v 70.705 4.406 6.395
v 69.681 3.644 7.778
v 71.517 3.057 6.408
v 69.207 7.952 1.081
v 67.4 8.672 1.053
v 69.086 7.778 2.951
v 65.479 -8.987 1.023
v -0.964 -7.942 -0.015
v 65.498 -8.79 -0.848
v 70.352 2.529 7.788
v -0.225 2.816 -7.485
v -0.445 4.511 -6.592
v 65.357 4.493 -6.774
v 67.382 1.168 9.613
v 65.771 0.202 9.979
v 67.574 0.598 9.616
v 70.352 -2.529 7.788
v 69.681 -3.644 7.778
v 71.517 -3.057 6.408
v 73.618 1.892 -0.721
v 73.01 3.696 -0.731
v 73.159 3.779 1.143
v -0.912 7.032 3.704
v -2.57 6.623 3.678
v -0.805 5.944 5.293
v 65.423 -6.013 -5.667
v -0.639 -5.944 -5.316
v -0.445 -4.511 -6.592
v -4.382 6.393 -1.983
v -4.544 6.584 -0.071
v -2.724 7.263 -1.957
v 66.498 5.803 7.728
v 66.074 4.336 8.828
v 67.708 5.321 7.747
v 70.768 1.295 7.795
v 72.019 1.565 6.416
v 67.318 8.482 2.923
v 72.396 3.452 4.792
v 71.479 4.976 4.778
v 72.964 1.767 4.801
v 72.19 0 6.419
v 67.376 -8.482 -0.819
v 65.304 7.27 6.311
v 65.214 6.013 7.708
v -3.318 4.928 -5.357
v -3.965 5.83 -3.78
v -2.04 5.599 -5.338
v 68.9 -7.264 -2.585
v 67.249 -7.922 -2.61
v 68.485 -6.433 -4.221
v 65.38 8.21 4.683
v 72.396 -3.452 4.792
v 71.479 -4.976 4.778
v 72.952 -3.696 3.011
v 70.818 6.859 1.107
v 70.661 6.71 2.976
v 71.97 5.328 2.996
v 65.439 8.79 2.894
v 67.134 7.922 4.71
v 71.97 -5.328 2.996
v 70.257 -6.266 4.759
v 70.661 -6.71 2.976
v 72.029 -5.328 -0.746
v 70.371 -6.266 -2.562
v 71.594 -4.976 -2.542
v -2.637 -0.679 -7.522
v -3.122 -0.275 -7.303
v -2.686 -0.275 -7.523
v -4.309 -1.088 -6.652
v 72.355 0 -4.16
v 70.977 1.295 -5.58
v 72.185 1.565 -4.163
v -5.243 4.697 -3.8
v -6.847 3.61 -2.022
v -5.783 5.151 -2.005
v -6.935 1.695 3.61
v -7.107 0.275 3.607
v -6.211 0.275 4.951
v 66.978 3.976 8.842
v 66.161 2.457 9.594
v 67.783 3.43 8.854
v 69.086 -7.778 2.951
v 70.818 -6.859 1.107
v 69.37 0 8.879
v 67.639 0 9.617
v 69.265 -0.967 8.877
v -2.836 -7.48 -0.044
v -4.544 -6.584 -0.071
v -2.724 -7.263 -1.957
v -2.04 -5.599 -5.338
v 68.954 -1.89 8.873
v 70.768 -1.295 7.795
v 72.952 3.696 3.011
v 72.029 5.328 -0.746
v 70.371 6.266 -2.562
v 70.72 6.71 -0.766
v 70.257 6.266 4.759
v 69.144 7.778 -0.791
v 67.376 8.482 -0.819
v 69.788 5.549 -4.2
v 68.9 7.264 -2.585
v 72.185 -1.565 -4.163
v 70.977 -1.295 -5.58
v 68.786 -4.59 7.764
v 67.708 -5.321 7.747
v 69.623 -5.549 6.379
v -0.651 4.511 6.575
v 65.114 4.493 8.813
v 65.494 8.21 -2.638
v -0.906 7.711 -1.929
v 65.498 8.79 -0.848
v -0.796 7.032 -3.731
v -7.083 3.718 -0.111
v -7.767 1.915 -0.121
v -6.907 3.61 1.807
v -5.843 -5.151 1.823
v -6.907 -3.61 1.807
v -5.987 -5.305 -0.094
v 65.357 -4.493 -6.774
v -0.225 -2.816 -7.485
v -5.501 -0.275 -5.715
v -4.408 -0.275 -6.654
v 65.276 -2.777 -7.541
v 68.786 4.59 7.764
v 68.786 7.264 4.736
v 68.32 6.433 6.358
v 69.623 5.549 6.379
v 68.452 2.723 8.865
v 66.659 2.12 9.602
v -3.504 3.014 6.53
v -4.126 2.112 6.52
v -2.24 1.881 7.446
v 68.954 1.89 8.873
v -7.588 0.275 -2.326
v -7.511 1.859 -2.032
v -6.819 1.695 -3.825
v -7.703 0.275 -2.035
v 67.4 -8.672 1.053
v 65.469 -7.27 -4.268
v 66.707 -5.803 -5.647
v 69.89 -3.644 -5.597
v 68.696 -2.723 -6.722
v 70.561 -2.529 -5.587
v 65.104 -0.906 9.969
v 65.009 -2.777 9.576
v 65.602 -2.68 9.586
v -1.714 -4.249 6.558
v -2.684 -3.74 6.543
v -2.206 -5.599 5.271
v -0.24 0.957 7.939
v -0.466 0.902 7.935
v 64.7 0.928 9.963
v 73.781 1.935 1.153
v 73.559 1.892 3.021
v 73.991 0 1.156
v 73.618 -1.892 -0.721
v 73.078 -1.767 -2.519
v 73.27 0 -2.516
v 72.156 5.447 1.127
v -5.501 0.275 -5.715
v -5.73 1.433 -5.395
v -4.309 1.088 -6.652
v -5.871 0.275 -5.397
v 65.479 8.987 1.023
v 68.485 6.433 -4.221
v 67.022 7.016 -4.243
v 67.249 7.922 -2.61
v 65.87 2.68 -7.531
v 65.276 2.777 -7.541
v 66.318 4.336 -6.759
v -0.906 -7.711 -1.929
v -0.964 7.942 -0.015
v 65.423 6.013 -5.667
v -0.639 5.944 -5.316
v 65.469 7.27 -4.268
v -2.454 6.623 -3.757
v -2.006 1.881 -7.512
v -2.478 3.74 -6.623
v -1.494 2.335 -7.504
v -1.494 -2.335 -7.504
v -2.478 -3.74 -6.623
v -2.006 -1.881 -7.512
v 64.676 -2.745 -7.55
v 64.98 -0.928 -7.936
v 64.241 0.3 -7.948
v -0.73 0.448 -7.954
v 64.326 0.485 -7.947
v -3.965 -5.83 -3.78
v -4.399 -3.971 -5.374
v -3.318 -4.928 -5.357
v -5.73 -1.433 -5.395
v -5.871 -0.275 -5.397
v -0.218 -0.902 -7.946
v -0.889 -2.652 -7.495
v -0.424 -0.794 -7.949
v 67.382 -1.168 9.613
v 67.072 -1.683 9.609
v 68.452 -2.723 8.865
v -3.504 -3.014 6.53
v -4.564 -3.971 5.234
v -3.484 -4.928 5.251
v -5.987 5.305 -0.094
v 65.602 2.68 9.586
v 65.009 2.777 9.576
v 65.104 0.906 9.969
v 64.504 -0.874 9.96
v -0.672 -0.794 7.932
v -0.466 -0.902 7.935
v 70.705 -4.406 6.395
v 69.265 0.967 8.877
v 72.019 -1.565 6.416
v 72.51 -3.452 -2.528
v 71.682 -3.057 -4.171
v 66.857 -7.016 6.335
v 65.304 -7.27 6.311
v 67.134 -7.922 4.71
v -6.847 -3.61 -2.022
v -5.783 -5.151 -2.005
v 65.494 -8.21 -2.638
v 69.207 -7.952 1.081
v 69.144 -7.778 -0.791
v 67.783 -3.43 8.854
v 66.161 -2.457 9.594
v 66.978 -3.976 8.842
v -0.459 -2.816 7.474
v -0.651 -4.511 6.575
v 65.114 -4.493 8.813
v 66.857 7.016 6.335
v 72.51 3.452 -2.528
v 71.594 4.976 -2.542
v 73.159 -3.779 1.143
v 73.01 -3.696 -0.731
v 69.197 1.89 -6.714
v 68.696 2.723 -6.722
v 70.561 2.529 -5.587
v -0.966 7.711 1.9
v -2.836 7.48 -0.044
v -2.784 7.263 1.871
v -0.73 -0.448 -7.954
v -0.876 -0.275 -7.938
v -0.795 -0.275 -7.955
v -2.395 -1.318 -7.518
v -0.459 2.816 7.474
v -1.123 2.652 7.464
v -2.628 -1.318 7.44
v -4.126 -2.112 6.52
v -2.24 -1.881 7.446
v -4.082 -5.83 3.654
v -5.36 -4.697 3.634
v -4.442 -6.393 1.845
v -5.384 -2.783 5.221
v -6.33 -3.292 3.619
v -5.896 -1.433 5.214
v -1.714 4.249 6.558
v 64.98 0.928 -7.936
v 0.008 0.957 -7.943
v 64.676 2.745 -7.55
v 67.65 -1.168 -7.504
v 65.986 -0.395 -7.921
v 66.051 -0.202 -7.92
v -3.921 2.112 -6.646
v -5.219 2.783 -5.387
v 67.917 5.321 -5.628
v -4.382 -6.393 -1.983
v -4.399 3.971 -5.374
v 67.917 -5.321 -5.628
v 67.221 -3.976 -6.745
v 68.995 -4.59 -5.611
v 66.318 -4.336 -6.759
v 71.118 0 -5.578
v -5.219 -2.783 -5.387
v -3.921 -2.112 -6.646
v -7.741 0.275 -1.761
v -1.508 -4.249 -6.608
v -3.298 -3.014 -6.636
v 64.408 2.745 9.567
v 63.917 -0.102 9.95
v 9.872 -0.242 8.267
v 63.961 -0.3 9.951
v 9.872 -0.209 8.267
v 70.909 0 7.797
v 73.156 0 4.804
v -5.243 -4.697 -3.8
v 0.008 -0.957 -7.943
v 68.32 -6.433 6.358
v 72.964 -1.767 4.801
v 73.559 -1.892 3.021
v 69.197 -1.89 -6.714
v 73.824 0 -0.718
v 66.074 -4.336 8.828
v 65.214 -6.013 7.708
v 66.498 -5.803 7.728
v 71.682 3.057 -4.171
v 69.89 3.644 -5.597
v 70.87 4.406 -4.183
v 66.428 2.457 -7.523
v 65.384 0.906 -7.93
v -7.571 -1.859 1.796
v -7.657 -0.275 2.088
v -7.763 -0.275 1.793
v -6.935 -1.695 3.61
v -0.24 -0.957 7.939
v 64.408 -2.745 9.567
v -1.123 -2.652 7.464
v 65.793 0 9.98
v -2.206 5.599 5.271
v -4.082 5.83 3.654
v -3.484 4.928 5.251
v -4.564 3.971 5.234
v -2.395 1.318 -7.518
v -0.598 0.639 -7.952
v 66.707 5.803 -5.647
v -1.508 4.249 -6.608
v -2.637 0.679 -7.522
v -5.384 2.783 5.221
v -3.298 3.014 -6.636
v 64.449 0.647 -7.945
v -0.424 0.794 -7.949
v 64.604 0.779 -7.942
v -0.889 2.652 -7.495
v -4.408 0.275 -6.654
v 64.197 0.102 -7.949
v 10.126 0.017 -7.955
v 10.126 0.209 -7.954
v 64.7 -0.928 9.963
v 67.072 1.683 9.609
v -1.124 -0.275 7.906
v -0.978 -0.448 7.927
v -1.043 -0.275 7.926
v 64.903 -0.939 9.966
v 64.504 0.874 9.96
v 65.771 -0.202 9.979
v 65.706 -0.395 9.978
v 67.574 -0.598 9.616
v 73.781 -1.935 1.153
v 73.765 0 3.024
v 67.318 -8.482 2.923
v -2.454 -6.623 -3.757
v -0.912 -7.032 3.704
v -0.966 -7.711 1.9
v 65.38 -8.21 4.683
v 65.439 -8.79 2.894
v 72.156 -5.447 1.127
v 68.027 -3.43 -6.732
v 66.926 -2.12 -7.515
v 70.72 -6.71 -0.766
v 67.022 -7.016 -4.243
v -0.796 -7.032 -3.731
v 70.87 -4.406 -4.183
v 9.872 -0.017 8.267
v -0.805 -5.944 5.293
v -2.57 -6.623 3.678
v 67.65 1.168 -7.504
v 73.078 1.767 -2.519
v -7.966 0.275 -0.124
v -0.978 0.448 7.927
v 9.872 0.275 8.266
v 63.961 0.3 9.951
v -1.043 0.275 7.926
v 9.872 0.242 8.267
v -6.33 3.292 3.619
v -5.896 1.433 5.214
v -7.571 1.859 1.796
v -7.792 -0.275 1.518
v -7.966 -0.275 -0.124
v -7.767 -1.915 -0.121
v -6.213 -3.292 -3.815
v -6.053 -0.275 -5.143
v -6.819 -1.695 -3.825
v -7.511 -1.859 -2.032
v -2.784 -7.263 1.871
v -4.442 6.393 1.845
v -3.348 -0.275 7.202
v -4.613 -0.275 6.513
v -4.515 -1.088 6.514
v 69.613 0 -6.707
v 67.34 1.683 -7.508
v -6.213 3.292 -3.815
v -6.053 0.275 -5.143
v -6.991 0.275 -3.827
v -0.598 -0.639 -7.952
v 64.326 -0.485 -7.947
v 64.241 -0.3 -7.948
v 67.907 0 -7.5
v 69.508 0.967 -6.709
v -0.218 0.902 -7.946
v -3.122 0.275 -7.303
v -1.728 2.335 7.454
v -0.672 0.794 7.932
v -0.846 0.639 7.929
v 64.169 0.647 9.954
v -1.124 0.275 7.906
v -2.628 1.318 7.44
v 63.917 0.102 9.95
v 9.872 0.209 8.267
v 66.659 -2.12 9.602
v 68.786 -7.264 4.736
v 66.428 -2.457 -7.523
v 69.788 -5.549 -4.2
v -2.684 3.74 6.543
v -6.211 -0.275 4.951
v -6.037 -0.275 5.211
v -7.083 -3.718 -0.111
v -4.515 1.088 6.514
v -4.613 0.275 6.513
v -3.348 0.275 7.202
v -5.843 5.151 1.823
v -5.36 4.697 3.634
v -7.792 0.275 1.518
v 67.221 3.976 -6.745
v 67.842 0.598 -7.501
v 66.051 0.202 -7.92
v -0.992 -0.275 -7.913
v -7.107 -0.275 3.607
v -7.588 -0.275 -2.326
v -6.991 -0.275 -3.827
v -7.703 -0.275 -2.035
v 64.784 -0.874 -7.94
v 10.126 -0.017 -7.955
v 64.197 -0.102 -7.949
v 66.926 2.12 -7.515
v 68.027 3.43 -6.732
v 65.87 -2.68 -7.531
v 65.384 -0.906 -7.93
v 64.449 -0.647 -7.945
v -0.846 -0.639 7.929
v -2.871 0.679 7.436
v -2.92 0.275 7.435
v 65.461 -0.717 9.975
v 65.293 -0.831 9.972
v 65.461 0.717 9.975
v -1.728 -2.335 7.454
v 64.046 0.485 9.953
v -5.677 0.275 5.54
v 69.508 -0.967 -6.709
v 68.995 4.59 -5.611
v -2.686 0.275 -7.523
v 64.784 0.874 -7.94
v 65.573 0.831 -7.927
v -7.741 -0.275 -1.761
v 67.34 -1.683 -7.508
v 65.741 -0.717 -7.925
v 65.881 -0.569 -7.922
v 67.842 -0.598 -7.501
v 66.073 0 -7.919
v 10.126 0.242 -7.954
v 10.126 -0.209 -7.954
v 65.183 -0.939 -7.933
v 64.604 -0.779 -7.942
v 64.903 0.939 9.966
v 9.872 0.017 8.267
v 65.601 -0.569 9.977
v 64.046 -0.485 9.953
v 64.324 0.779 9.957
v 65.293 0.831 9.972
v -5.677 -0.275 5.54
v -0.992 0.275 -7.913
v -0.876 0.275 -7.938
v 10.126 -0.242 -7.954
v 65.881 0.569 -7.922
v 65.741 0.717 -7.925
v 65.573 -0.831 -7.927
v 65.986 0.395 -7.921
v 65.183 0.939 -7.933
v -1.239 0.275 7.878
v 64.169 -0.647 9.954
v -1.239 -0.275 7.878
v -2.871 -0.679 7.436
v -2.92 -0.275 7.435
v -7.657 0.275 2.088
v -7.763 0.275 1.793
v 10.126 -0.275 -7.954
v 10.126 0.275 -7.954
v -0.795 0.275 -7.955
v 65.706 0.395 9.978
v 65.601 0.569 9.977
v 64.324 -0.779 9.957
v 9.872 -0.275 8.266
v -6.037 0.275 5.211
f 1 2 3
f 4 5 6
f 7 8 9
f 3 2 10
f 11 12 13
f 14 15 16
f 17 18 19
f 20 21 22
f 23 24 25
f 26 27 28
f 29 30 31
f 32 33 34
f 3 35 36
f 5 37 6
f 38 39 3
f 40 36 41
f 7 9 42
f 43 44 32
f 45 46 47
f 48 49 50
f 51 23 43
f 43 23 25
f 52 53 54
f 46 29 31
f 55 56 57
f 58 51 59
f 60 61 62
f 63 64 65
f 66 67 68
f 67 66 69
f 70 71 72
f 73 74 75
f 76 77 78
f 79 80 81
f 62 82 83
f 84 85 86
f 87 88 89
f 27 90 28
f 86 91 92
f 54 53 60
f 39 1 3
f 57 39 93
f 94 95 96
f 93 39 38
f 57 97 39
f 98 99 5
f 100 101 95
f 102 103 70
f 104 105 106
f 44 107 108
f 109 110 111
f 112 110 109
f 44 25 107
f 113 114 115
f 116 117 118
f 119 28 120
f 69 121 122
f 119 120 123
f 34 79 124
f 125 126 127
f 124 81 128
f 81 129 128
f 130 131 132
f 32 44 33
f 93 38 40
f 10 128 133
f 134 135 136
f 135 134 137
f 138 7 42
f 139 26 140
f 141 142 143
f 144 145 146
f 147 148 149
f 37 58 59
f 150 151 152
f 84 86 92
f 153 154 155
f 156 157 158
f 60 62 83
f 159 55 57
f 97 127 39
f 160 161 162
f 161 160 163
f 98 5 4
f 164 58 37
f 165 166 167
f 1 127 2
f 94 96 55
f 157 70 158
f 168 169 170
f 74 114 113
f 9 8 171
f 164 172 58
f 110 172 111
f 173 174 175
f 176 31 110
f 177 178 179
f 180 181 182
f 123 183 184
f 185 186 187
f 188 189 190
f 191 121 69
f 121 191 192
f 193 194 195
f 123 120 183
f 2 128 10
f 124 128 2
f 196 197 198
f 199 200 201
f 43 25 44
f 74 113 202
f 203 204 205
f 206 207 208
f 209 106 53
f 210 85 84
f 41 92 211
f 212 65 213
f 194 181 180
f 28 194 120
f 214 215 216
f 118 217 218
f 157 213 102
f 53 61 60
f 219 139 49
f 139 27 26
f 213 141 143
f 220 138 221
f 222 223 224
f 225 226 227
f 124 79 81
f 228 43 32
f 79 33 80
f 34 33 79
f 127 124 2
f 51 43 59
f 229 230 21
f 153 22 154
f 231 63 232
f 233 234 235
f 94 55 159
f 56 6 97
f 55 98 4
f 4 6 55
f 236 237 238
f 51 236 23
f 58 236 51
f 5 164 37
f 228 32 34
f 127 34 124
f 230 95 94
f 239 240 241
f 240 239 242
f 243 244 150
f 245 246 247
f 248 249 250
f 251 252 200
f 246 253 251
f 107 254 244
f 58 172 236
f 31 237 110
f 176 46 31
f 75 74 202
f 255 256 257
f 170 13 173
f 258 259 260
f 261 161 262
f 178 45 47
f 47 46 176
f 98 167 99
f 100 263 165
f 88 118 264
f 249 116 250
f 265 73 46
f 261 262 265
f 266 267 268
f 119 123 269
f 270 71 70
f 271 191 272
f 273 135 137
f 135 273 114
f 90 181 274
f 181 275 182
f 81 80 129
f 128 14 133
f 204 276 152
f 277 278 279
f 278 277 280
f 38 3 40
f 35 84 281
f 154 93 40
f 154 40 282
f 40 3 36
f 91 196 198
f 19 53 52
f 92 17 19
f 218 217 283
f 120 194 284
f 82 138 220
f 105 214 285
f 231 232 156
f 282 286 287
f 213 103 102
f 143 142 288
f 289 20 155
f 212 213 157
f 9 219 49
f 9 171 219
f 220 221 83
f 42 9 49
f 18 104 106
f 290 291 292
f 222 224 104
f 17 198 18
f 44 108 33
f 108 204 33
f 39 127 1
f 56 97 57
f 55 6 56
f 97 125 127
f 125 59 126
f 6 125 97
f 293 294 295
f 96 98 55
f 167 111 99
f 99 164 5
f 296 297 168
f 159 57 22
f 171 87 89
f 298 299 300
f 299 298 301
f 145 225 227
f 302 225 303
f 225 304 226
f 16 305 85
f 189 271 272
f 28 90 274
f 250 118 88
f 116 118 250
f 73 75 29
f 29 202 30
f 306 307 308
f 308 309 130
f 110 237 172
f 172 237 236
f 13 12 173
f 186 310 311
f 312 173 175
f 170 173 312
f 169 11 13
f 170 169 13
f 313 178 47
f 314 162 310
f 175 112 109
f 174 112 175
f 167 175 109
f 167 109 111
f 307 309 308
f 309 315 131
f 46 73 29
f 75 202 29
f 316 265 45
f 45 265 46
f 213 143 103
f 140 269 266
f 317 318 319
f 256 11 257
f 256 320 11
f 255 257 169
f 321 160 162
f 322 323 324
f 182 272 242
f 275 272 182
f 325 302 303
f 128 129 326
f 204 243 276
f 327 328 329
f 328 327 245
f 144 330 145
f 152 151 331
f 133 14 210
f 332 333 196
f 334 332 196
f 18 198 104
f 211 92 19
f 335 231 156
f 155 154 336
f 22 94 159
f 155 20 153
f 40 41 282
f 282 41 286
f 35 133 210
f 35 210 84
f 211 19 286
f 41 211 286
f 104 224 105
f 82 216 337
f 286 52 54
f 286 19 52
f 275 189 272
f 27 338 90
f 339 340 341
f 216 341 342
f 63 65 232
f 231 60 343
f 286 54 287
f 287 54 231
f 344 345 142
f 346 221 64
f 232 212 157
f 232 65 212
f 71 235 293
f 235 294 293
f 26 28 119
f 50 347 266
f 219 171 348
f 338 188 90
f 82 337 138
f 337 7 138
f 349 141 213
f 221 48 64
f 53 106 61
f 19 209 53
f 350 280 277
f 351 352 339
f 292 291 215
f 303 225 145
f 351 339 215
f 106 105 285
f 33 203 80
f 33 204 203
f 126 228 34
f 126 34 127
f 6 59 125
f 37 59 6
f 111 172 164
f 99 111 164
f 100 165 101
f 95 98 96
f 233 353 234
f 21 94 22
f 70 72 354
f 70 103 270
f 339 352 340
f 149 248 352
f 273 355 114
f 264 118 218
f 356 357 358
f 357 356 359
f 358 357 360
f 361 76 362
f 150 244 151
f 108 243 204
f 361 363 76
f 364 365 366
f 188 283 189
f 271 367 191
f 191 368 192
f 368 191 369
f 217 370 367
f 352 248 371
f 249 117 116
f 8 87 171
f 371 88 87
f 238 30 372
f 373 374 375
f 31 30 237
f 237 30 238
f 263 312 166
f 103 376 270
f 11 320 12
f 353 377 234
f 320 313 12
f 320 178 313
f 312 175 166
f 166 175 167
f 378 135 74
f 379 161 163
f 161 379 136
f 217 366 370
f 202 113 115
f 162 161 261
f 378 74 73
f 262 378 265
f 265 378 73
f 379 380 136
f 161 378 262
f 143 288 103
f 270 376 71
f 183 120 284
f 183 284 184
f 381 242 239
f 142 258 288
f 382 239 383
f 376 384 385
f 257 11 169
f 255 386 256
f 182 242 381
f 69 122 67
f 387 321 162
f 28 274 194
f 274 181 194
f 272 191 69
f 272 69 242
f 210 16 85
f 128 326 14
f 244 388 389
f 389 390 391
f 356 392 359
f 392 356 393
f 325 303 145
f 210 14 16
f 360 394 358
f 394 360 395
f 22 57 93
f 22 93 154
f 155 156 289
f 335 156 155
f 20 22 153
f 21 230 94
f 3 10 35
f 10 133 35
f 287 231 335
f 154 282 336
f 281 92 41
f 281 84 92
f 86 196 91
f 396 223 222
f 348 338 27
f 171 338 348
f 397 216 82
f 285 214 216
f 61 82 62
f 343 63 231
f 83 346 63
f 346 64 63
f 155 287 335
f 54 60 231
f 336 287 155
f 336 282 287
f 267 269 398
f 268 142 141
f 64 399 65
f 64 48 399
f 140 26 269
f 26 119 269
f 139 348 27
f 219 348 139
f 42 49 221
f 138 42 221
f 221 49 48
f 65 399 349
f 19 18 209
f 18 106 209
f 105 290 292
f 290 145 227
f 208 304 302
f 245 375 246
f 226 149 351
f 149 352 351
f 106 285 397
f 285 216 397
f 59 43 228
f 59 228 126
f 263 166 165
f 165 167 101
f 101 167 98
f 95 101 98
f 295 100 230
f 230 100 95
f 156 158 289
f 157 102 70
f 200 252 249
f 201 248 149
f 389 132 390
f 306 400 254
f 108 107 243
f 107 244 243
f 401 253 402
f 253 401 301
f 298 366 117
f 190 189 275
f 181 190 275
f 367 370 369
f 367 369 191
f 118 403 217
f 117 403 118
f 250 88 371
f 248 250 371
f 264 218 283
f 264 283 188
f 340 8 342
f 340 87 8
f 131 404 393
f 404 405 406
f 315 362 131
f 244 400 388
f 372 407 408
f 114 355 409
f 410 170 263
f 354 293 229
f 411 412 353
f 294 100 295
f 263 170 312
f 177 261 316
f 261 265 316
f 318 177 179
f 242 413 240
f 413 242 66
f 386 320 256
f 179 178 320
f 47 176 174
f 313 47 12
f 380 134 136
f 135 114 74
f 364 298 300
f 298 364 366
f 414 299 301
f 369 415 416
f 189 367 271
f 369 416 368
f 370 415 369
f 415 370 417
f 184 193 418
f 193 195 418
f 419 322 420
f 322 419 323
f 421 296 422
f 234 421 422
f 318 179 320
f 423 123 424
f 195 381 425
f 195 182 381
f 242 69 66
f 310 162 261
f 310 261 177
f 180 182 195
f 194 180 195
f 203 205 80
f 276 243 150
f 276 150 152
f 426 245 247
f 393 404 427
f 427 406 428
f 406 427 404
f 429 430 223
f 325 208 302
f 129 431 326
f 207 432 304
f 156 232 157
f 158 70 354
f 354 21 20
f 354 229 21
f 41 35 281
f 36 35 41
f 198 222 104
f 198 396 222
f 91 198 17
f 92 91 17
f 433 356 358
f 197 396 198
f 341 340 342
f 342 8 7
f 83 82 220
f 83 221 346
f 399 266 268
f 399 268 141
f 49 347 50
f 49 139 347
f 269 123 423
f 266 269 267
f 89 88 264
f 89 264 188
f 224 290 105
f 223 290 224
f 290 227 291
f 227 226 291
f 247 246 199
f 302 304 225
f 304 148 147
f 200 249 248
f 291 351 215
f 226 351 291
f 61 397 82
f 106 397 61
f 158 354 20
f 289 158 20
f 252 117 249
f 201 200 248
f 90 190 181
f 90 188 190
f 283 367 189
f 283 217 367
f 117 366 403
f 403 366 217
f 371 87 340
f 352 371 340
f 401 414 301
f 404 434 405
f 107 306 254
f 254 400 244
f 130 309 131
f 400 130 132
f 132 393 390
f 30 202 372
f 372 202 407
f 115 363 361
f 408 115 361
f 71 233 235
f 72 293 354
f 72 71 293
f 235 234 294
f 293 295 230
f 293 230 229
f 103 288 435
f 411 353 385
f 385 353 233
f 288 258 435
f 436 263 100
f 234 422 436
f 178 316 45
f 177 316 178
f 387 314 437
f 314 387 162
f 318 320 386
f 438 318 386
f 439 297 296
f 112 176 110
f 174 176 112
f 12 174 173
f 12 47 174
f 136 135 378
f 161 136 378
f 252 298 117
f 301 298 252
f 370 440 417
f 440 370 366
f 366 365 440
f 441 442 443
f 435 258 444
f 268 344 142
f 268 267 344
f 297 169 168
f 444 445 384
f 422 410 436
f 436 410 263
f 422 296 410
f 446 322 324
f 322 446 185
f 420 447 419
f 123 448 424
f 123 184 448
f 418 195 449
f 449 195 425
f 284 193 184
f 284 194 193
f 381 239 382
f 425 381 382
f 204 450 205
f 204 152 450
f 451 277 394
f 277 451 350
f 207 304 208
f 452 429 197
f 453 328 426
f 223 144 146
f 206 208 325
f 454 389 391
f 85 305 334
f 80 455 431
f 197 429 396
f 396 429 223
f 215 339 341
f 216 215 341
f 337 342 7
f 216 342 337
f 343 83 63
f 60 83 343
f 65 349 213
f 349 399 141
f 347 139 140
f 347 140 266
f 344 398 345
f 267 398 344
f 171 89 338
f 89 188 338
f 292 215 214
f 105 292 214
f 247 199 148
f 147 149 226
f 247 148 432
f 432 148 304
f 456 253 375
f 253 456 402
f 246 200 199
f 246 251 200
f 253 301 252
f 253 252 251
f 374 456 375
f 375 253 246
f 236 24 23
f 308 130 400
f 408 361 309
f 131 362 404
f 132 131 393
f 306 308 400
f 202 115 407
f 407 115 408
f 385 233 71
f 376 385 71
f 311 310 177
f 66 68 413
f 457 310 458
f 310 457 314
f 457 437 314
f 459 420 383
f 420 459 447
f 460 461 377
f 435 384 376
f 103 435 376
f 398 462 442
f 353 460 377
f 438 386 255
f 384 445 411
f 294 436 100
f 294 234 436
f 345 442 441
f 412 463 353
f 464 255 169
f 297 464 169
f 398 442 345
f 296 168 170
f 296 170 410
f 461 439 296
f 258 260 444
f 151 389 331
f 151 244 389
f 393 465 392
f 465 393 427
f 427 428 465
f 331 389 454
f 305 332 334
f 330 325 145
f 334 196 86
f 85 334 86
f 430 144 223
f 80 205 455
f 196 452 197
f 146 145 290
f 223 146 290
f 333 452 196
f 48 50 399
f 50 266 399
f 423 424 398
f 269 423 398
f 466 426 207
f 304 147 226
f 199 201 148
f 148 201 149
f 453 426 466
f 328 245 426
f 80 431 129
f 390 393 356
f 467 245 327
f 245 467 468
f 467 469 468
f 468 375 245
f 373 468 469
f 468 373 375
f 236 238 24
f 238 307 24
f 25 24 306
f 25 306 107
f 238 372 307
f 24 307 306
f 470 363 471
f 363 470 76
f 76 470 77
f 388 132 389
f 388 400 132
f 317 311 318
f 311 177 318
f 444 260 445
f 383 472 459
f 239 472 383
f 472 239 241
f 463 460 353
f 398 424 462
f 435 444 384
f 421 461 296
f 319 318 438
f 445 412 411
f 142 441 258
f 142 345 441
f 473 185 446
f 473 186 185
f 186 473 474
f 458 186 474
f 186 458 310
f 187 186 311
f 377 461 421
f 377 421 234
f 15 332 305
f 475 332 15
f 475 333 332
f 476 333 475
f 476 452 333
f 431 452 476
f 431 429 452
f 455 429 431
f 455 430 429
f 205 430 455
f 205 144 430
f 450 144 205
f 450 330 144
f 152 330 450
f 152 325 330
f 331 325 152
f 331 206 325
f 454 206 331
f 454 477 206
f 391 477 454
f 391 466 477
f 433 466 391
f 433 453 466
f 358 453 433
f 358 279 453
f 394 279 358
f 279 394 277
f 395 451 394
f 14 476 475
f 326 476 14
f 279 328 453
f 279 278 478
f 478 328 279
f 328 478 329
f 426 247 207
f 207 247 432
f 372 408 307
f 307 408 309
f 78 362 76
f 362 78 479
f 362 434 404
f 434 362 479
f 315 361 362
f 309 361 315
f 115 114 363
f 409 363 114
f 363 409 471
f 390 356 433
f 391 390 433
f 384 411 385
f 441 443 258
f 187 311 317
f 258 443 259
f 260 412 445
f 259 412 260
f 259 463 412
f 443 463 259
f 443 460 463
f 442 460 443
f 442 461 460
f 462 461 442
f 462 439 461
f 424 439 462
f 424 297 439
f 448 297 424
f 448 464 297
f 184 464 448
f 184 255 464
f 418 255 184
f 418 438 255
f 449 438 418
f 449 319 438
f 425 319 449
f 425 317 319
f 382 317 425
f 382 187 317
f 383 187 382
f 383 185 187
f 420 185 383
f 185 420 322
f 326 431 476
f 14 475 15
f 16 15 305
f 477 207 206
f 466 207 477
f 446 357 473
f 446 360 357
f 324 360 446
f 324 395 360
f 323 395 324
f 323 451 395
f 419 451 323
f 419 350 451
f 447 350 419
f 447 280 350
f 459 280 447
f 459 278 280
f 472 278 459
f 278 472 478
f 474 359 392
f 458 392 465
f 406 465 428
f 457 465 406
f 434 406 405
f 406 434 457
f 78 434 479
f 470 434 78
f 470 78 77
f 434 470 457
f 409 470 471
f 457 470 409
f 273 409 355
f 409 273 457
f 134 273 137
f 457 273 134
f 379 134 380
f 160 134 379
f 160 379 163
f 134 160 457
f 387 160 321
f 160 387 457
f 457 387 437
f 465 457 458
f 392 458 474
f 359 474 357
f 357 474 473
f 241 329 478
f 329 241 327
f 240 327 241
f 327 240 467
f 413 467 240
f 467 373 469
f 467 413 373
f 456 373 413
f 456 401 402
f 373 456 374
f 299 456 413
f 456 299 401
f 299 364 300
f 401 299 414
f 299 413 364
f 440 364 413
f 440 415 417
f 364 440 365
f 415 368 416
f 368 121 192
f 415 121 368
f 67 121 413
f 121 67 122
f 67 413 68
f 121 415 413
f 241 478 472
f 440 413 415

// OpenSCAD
rotate([0,atan(-1/64),0]){
    difference(){
        hull(){
            sphere(d=16);
            translate([65,0,0])
                sphere(d=18);
        }
        cube([20,.55,1000], center=true);
    }
}
